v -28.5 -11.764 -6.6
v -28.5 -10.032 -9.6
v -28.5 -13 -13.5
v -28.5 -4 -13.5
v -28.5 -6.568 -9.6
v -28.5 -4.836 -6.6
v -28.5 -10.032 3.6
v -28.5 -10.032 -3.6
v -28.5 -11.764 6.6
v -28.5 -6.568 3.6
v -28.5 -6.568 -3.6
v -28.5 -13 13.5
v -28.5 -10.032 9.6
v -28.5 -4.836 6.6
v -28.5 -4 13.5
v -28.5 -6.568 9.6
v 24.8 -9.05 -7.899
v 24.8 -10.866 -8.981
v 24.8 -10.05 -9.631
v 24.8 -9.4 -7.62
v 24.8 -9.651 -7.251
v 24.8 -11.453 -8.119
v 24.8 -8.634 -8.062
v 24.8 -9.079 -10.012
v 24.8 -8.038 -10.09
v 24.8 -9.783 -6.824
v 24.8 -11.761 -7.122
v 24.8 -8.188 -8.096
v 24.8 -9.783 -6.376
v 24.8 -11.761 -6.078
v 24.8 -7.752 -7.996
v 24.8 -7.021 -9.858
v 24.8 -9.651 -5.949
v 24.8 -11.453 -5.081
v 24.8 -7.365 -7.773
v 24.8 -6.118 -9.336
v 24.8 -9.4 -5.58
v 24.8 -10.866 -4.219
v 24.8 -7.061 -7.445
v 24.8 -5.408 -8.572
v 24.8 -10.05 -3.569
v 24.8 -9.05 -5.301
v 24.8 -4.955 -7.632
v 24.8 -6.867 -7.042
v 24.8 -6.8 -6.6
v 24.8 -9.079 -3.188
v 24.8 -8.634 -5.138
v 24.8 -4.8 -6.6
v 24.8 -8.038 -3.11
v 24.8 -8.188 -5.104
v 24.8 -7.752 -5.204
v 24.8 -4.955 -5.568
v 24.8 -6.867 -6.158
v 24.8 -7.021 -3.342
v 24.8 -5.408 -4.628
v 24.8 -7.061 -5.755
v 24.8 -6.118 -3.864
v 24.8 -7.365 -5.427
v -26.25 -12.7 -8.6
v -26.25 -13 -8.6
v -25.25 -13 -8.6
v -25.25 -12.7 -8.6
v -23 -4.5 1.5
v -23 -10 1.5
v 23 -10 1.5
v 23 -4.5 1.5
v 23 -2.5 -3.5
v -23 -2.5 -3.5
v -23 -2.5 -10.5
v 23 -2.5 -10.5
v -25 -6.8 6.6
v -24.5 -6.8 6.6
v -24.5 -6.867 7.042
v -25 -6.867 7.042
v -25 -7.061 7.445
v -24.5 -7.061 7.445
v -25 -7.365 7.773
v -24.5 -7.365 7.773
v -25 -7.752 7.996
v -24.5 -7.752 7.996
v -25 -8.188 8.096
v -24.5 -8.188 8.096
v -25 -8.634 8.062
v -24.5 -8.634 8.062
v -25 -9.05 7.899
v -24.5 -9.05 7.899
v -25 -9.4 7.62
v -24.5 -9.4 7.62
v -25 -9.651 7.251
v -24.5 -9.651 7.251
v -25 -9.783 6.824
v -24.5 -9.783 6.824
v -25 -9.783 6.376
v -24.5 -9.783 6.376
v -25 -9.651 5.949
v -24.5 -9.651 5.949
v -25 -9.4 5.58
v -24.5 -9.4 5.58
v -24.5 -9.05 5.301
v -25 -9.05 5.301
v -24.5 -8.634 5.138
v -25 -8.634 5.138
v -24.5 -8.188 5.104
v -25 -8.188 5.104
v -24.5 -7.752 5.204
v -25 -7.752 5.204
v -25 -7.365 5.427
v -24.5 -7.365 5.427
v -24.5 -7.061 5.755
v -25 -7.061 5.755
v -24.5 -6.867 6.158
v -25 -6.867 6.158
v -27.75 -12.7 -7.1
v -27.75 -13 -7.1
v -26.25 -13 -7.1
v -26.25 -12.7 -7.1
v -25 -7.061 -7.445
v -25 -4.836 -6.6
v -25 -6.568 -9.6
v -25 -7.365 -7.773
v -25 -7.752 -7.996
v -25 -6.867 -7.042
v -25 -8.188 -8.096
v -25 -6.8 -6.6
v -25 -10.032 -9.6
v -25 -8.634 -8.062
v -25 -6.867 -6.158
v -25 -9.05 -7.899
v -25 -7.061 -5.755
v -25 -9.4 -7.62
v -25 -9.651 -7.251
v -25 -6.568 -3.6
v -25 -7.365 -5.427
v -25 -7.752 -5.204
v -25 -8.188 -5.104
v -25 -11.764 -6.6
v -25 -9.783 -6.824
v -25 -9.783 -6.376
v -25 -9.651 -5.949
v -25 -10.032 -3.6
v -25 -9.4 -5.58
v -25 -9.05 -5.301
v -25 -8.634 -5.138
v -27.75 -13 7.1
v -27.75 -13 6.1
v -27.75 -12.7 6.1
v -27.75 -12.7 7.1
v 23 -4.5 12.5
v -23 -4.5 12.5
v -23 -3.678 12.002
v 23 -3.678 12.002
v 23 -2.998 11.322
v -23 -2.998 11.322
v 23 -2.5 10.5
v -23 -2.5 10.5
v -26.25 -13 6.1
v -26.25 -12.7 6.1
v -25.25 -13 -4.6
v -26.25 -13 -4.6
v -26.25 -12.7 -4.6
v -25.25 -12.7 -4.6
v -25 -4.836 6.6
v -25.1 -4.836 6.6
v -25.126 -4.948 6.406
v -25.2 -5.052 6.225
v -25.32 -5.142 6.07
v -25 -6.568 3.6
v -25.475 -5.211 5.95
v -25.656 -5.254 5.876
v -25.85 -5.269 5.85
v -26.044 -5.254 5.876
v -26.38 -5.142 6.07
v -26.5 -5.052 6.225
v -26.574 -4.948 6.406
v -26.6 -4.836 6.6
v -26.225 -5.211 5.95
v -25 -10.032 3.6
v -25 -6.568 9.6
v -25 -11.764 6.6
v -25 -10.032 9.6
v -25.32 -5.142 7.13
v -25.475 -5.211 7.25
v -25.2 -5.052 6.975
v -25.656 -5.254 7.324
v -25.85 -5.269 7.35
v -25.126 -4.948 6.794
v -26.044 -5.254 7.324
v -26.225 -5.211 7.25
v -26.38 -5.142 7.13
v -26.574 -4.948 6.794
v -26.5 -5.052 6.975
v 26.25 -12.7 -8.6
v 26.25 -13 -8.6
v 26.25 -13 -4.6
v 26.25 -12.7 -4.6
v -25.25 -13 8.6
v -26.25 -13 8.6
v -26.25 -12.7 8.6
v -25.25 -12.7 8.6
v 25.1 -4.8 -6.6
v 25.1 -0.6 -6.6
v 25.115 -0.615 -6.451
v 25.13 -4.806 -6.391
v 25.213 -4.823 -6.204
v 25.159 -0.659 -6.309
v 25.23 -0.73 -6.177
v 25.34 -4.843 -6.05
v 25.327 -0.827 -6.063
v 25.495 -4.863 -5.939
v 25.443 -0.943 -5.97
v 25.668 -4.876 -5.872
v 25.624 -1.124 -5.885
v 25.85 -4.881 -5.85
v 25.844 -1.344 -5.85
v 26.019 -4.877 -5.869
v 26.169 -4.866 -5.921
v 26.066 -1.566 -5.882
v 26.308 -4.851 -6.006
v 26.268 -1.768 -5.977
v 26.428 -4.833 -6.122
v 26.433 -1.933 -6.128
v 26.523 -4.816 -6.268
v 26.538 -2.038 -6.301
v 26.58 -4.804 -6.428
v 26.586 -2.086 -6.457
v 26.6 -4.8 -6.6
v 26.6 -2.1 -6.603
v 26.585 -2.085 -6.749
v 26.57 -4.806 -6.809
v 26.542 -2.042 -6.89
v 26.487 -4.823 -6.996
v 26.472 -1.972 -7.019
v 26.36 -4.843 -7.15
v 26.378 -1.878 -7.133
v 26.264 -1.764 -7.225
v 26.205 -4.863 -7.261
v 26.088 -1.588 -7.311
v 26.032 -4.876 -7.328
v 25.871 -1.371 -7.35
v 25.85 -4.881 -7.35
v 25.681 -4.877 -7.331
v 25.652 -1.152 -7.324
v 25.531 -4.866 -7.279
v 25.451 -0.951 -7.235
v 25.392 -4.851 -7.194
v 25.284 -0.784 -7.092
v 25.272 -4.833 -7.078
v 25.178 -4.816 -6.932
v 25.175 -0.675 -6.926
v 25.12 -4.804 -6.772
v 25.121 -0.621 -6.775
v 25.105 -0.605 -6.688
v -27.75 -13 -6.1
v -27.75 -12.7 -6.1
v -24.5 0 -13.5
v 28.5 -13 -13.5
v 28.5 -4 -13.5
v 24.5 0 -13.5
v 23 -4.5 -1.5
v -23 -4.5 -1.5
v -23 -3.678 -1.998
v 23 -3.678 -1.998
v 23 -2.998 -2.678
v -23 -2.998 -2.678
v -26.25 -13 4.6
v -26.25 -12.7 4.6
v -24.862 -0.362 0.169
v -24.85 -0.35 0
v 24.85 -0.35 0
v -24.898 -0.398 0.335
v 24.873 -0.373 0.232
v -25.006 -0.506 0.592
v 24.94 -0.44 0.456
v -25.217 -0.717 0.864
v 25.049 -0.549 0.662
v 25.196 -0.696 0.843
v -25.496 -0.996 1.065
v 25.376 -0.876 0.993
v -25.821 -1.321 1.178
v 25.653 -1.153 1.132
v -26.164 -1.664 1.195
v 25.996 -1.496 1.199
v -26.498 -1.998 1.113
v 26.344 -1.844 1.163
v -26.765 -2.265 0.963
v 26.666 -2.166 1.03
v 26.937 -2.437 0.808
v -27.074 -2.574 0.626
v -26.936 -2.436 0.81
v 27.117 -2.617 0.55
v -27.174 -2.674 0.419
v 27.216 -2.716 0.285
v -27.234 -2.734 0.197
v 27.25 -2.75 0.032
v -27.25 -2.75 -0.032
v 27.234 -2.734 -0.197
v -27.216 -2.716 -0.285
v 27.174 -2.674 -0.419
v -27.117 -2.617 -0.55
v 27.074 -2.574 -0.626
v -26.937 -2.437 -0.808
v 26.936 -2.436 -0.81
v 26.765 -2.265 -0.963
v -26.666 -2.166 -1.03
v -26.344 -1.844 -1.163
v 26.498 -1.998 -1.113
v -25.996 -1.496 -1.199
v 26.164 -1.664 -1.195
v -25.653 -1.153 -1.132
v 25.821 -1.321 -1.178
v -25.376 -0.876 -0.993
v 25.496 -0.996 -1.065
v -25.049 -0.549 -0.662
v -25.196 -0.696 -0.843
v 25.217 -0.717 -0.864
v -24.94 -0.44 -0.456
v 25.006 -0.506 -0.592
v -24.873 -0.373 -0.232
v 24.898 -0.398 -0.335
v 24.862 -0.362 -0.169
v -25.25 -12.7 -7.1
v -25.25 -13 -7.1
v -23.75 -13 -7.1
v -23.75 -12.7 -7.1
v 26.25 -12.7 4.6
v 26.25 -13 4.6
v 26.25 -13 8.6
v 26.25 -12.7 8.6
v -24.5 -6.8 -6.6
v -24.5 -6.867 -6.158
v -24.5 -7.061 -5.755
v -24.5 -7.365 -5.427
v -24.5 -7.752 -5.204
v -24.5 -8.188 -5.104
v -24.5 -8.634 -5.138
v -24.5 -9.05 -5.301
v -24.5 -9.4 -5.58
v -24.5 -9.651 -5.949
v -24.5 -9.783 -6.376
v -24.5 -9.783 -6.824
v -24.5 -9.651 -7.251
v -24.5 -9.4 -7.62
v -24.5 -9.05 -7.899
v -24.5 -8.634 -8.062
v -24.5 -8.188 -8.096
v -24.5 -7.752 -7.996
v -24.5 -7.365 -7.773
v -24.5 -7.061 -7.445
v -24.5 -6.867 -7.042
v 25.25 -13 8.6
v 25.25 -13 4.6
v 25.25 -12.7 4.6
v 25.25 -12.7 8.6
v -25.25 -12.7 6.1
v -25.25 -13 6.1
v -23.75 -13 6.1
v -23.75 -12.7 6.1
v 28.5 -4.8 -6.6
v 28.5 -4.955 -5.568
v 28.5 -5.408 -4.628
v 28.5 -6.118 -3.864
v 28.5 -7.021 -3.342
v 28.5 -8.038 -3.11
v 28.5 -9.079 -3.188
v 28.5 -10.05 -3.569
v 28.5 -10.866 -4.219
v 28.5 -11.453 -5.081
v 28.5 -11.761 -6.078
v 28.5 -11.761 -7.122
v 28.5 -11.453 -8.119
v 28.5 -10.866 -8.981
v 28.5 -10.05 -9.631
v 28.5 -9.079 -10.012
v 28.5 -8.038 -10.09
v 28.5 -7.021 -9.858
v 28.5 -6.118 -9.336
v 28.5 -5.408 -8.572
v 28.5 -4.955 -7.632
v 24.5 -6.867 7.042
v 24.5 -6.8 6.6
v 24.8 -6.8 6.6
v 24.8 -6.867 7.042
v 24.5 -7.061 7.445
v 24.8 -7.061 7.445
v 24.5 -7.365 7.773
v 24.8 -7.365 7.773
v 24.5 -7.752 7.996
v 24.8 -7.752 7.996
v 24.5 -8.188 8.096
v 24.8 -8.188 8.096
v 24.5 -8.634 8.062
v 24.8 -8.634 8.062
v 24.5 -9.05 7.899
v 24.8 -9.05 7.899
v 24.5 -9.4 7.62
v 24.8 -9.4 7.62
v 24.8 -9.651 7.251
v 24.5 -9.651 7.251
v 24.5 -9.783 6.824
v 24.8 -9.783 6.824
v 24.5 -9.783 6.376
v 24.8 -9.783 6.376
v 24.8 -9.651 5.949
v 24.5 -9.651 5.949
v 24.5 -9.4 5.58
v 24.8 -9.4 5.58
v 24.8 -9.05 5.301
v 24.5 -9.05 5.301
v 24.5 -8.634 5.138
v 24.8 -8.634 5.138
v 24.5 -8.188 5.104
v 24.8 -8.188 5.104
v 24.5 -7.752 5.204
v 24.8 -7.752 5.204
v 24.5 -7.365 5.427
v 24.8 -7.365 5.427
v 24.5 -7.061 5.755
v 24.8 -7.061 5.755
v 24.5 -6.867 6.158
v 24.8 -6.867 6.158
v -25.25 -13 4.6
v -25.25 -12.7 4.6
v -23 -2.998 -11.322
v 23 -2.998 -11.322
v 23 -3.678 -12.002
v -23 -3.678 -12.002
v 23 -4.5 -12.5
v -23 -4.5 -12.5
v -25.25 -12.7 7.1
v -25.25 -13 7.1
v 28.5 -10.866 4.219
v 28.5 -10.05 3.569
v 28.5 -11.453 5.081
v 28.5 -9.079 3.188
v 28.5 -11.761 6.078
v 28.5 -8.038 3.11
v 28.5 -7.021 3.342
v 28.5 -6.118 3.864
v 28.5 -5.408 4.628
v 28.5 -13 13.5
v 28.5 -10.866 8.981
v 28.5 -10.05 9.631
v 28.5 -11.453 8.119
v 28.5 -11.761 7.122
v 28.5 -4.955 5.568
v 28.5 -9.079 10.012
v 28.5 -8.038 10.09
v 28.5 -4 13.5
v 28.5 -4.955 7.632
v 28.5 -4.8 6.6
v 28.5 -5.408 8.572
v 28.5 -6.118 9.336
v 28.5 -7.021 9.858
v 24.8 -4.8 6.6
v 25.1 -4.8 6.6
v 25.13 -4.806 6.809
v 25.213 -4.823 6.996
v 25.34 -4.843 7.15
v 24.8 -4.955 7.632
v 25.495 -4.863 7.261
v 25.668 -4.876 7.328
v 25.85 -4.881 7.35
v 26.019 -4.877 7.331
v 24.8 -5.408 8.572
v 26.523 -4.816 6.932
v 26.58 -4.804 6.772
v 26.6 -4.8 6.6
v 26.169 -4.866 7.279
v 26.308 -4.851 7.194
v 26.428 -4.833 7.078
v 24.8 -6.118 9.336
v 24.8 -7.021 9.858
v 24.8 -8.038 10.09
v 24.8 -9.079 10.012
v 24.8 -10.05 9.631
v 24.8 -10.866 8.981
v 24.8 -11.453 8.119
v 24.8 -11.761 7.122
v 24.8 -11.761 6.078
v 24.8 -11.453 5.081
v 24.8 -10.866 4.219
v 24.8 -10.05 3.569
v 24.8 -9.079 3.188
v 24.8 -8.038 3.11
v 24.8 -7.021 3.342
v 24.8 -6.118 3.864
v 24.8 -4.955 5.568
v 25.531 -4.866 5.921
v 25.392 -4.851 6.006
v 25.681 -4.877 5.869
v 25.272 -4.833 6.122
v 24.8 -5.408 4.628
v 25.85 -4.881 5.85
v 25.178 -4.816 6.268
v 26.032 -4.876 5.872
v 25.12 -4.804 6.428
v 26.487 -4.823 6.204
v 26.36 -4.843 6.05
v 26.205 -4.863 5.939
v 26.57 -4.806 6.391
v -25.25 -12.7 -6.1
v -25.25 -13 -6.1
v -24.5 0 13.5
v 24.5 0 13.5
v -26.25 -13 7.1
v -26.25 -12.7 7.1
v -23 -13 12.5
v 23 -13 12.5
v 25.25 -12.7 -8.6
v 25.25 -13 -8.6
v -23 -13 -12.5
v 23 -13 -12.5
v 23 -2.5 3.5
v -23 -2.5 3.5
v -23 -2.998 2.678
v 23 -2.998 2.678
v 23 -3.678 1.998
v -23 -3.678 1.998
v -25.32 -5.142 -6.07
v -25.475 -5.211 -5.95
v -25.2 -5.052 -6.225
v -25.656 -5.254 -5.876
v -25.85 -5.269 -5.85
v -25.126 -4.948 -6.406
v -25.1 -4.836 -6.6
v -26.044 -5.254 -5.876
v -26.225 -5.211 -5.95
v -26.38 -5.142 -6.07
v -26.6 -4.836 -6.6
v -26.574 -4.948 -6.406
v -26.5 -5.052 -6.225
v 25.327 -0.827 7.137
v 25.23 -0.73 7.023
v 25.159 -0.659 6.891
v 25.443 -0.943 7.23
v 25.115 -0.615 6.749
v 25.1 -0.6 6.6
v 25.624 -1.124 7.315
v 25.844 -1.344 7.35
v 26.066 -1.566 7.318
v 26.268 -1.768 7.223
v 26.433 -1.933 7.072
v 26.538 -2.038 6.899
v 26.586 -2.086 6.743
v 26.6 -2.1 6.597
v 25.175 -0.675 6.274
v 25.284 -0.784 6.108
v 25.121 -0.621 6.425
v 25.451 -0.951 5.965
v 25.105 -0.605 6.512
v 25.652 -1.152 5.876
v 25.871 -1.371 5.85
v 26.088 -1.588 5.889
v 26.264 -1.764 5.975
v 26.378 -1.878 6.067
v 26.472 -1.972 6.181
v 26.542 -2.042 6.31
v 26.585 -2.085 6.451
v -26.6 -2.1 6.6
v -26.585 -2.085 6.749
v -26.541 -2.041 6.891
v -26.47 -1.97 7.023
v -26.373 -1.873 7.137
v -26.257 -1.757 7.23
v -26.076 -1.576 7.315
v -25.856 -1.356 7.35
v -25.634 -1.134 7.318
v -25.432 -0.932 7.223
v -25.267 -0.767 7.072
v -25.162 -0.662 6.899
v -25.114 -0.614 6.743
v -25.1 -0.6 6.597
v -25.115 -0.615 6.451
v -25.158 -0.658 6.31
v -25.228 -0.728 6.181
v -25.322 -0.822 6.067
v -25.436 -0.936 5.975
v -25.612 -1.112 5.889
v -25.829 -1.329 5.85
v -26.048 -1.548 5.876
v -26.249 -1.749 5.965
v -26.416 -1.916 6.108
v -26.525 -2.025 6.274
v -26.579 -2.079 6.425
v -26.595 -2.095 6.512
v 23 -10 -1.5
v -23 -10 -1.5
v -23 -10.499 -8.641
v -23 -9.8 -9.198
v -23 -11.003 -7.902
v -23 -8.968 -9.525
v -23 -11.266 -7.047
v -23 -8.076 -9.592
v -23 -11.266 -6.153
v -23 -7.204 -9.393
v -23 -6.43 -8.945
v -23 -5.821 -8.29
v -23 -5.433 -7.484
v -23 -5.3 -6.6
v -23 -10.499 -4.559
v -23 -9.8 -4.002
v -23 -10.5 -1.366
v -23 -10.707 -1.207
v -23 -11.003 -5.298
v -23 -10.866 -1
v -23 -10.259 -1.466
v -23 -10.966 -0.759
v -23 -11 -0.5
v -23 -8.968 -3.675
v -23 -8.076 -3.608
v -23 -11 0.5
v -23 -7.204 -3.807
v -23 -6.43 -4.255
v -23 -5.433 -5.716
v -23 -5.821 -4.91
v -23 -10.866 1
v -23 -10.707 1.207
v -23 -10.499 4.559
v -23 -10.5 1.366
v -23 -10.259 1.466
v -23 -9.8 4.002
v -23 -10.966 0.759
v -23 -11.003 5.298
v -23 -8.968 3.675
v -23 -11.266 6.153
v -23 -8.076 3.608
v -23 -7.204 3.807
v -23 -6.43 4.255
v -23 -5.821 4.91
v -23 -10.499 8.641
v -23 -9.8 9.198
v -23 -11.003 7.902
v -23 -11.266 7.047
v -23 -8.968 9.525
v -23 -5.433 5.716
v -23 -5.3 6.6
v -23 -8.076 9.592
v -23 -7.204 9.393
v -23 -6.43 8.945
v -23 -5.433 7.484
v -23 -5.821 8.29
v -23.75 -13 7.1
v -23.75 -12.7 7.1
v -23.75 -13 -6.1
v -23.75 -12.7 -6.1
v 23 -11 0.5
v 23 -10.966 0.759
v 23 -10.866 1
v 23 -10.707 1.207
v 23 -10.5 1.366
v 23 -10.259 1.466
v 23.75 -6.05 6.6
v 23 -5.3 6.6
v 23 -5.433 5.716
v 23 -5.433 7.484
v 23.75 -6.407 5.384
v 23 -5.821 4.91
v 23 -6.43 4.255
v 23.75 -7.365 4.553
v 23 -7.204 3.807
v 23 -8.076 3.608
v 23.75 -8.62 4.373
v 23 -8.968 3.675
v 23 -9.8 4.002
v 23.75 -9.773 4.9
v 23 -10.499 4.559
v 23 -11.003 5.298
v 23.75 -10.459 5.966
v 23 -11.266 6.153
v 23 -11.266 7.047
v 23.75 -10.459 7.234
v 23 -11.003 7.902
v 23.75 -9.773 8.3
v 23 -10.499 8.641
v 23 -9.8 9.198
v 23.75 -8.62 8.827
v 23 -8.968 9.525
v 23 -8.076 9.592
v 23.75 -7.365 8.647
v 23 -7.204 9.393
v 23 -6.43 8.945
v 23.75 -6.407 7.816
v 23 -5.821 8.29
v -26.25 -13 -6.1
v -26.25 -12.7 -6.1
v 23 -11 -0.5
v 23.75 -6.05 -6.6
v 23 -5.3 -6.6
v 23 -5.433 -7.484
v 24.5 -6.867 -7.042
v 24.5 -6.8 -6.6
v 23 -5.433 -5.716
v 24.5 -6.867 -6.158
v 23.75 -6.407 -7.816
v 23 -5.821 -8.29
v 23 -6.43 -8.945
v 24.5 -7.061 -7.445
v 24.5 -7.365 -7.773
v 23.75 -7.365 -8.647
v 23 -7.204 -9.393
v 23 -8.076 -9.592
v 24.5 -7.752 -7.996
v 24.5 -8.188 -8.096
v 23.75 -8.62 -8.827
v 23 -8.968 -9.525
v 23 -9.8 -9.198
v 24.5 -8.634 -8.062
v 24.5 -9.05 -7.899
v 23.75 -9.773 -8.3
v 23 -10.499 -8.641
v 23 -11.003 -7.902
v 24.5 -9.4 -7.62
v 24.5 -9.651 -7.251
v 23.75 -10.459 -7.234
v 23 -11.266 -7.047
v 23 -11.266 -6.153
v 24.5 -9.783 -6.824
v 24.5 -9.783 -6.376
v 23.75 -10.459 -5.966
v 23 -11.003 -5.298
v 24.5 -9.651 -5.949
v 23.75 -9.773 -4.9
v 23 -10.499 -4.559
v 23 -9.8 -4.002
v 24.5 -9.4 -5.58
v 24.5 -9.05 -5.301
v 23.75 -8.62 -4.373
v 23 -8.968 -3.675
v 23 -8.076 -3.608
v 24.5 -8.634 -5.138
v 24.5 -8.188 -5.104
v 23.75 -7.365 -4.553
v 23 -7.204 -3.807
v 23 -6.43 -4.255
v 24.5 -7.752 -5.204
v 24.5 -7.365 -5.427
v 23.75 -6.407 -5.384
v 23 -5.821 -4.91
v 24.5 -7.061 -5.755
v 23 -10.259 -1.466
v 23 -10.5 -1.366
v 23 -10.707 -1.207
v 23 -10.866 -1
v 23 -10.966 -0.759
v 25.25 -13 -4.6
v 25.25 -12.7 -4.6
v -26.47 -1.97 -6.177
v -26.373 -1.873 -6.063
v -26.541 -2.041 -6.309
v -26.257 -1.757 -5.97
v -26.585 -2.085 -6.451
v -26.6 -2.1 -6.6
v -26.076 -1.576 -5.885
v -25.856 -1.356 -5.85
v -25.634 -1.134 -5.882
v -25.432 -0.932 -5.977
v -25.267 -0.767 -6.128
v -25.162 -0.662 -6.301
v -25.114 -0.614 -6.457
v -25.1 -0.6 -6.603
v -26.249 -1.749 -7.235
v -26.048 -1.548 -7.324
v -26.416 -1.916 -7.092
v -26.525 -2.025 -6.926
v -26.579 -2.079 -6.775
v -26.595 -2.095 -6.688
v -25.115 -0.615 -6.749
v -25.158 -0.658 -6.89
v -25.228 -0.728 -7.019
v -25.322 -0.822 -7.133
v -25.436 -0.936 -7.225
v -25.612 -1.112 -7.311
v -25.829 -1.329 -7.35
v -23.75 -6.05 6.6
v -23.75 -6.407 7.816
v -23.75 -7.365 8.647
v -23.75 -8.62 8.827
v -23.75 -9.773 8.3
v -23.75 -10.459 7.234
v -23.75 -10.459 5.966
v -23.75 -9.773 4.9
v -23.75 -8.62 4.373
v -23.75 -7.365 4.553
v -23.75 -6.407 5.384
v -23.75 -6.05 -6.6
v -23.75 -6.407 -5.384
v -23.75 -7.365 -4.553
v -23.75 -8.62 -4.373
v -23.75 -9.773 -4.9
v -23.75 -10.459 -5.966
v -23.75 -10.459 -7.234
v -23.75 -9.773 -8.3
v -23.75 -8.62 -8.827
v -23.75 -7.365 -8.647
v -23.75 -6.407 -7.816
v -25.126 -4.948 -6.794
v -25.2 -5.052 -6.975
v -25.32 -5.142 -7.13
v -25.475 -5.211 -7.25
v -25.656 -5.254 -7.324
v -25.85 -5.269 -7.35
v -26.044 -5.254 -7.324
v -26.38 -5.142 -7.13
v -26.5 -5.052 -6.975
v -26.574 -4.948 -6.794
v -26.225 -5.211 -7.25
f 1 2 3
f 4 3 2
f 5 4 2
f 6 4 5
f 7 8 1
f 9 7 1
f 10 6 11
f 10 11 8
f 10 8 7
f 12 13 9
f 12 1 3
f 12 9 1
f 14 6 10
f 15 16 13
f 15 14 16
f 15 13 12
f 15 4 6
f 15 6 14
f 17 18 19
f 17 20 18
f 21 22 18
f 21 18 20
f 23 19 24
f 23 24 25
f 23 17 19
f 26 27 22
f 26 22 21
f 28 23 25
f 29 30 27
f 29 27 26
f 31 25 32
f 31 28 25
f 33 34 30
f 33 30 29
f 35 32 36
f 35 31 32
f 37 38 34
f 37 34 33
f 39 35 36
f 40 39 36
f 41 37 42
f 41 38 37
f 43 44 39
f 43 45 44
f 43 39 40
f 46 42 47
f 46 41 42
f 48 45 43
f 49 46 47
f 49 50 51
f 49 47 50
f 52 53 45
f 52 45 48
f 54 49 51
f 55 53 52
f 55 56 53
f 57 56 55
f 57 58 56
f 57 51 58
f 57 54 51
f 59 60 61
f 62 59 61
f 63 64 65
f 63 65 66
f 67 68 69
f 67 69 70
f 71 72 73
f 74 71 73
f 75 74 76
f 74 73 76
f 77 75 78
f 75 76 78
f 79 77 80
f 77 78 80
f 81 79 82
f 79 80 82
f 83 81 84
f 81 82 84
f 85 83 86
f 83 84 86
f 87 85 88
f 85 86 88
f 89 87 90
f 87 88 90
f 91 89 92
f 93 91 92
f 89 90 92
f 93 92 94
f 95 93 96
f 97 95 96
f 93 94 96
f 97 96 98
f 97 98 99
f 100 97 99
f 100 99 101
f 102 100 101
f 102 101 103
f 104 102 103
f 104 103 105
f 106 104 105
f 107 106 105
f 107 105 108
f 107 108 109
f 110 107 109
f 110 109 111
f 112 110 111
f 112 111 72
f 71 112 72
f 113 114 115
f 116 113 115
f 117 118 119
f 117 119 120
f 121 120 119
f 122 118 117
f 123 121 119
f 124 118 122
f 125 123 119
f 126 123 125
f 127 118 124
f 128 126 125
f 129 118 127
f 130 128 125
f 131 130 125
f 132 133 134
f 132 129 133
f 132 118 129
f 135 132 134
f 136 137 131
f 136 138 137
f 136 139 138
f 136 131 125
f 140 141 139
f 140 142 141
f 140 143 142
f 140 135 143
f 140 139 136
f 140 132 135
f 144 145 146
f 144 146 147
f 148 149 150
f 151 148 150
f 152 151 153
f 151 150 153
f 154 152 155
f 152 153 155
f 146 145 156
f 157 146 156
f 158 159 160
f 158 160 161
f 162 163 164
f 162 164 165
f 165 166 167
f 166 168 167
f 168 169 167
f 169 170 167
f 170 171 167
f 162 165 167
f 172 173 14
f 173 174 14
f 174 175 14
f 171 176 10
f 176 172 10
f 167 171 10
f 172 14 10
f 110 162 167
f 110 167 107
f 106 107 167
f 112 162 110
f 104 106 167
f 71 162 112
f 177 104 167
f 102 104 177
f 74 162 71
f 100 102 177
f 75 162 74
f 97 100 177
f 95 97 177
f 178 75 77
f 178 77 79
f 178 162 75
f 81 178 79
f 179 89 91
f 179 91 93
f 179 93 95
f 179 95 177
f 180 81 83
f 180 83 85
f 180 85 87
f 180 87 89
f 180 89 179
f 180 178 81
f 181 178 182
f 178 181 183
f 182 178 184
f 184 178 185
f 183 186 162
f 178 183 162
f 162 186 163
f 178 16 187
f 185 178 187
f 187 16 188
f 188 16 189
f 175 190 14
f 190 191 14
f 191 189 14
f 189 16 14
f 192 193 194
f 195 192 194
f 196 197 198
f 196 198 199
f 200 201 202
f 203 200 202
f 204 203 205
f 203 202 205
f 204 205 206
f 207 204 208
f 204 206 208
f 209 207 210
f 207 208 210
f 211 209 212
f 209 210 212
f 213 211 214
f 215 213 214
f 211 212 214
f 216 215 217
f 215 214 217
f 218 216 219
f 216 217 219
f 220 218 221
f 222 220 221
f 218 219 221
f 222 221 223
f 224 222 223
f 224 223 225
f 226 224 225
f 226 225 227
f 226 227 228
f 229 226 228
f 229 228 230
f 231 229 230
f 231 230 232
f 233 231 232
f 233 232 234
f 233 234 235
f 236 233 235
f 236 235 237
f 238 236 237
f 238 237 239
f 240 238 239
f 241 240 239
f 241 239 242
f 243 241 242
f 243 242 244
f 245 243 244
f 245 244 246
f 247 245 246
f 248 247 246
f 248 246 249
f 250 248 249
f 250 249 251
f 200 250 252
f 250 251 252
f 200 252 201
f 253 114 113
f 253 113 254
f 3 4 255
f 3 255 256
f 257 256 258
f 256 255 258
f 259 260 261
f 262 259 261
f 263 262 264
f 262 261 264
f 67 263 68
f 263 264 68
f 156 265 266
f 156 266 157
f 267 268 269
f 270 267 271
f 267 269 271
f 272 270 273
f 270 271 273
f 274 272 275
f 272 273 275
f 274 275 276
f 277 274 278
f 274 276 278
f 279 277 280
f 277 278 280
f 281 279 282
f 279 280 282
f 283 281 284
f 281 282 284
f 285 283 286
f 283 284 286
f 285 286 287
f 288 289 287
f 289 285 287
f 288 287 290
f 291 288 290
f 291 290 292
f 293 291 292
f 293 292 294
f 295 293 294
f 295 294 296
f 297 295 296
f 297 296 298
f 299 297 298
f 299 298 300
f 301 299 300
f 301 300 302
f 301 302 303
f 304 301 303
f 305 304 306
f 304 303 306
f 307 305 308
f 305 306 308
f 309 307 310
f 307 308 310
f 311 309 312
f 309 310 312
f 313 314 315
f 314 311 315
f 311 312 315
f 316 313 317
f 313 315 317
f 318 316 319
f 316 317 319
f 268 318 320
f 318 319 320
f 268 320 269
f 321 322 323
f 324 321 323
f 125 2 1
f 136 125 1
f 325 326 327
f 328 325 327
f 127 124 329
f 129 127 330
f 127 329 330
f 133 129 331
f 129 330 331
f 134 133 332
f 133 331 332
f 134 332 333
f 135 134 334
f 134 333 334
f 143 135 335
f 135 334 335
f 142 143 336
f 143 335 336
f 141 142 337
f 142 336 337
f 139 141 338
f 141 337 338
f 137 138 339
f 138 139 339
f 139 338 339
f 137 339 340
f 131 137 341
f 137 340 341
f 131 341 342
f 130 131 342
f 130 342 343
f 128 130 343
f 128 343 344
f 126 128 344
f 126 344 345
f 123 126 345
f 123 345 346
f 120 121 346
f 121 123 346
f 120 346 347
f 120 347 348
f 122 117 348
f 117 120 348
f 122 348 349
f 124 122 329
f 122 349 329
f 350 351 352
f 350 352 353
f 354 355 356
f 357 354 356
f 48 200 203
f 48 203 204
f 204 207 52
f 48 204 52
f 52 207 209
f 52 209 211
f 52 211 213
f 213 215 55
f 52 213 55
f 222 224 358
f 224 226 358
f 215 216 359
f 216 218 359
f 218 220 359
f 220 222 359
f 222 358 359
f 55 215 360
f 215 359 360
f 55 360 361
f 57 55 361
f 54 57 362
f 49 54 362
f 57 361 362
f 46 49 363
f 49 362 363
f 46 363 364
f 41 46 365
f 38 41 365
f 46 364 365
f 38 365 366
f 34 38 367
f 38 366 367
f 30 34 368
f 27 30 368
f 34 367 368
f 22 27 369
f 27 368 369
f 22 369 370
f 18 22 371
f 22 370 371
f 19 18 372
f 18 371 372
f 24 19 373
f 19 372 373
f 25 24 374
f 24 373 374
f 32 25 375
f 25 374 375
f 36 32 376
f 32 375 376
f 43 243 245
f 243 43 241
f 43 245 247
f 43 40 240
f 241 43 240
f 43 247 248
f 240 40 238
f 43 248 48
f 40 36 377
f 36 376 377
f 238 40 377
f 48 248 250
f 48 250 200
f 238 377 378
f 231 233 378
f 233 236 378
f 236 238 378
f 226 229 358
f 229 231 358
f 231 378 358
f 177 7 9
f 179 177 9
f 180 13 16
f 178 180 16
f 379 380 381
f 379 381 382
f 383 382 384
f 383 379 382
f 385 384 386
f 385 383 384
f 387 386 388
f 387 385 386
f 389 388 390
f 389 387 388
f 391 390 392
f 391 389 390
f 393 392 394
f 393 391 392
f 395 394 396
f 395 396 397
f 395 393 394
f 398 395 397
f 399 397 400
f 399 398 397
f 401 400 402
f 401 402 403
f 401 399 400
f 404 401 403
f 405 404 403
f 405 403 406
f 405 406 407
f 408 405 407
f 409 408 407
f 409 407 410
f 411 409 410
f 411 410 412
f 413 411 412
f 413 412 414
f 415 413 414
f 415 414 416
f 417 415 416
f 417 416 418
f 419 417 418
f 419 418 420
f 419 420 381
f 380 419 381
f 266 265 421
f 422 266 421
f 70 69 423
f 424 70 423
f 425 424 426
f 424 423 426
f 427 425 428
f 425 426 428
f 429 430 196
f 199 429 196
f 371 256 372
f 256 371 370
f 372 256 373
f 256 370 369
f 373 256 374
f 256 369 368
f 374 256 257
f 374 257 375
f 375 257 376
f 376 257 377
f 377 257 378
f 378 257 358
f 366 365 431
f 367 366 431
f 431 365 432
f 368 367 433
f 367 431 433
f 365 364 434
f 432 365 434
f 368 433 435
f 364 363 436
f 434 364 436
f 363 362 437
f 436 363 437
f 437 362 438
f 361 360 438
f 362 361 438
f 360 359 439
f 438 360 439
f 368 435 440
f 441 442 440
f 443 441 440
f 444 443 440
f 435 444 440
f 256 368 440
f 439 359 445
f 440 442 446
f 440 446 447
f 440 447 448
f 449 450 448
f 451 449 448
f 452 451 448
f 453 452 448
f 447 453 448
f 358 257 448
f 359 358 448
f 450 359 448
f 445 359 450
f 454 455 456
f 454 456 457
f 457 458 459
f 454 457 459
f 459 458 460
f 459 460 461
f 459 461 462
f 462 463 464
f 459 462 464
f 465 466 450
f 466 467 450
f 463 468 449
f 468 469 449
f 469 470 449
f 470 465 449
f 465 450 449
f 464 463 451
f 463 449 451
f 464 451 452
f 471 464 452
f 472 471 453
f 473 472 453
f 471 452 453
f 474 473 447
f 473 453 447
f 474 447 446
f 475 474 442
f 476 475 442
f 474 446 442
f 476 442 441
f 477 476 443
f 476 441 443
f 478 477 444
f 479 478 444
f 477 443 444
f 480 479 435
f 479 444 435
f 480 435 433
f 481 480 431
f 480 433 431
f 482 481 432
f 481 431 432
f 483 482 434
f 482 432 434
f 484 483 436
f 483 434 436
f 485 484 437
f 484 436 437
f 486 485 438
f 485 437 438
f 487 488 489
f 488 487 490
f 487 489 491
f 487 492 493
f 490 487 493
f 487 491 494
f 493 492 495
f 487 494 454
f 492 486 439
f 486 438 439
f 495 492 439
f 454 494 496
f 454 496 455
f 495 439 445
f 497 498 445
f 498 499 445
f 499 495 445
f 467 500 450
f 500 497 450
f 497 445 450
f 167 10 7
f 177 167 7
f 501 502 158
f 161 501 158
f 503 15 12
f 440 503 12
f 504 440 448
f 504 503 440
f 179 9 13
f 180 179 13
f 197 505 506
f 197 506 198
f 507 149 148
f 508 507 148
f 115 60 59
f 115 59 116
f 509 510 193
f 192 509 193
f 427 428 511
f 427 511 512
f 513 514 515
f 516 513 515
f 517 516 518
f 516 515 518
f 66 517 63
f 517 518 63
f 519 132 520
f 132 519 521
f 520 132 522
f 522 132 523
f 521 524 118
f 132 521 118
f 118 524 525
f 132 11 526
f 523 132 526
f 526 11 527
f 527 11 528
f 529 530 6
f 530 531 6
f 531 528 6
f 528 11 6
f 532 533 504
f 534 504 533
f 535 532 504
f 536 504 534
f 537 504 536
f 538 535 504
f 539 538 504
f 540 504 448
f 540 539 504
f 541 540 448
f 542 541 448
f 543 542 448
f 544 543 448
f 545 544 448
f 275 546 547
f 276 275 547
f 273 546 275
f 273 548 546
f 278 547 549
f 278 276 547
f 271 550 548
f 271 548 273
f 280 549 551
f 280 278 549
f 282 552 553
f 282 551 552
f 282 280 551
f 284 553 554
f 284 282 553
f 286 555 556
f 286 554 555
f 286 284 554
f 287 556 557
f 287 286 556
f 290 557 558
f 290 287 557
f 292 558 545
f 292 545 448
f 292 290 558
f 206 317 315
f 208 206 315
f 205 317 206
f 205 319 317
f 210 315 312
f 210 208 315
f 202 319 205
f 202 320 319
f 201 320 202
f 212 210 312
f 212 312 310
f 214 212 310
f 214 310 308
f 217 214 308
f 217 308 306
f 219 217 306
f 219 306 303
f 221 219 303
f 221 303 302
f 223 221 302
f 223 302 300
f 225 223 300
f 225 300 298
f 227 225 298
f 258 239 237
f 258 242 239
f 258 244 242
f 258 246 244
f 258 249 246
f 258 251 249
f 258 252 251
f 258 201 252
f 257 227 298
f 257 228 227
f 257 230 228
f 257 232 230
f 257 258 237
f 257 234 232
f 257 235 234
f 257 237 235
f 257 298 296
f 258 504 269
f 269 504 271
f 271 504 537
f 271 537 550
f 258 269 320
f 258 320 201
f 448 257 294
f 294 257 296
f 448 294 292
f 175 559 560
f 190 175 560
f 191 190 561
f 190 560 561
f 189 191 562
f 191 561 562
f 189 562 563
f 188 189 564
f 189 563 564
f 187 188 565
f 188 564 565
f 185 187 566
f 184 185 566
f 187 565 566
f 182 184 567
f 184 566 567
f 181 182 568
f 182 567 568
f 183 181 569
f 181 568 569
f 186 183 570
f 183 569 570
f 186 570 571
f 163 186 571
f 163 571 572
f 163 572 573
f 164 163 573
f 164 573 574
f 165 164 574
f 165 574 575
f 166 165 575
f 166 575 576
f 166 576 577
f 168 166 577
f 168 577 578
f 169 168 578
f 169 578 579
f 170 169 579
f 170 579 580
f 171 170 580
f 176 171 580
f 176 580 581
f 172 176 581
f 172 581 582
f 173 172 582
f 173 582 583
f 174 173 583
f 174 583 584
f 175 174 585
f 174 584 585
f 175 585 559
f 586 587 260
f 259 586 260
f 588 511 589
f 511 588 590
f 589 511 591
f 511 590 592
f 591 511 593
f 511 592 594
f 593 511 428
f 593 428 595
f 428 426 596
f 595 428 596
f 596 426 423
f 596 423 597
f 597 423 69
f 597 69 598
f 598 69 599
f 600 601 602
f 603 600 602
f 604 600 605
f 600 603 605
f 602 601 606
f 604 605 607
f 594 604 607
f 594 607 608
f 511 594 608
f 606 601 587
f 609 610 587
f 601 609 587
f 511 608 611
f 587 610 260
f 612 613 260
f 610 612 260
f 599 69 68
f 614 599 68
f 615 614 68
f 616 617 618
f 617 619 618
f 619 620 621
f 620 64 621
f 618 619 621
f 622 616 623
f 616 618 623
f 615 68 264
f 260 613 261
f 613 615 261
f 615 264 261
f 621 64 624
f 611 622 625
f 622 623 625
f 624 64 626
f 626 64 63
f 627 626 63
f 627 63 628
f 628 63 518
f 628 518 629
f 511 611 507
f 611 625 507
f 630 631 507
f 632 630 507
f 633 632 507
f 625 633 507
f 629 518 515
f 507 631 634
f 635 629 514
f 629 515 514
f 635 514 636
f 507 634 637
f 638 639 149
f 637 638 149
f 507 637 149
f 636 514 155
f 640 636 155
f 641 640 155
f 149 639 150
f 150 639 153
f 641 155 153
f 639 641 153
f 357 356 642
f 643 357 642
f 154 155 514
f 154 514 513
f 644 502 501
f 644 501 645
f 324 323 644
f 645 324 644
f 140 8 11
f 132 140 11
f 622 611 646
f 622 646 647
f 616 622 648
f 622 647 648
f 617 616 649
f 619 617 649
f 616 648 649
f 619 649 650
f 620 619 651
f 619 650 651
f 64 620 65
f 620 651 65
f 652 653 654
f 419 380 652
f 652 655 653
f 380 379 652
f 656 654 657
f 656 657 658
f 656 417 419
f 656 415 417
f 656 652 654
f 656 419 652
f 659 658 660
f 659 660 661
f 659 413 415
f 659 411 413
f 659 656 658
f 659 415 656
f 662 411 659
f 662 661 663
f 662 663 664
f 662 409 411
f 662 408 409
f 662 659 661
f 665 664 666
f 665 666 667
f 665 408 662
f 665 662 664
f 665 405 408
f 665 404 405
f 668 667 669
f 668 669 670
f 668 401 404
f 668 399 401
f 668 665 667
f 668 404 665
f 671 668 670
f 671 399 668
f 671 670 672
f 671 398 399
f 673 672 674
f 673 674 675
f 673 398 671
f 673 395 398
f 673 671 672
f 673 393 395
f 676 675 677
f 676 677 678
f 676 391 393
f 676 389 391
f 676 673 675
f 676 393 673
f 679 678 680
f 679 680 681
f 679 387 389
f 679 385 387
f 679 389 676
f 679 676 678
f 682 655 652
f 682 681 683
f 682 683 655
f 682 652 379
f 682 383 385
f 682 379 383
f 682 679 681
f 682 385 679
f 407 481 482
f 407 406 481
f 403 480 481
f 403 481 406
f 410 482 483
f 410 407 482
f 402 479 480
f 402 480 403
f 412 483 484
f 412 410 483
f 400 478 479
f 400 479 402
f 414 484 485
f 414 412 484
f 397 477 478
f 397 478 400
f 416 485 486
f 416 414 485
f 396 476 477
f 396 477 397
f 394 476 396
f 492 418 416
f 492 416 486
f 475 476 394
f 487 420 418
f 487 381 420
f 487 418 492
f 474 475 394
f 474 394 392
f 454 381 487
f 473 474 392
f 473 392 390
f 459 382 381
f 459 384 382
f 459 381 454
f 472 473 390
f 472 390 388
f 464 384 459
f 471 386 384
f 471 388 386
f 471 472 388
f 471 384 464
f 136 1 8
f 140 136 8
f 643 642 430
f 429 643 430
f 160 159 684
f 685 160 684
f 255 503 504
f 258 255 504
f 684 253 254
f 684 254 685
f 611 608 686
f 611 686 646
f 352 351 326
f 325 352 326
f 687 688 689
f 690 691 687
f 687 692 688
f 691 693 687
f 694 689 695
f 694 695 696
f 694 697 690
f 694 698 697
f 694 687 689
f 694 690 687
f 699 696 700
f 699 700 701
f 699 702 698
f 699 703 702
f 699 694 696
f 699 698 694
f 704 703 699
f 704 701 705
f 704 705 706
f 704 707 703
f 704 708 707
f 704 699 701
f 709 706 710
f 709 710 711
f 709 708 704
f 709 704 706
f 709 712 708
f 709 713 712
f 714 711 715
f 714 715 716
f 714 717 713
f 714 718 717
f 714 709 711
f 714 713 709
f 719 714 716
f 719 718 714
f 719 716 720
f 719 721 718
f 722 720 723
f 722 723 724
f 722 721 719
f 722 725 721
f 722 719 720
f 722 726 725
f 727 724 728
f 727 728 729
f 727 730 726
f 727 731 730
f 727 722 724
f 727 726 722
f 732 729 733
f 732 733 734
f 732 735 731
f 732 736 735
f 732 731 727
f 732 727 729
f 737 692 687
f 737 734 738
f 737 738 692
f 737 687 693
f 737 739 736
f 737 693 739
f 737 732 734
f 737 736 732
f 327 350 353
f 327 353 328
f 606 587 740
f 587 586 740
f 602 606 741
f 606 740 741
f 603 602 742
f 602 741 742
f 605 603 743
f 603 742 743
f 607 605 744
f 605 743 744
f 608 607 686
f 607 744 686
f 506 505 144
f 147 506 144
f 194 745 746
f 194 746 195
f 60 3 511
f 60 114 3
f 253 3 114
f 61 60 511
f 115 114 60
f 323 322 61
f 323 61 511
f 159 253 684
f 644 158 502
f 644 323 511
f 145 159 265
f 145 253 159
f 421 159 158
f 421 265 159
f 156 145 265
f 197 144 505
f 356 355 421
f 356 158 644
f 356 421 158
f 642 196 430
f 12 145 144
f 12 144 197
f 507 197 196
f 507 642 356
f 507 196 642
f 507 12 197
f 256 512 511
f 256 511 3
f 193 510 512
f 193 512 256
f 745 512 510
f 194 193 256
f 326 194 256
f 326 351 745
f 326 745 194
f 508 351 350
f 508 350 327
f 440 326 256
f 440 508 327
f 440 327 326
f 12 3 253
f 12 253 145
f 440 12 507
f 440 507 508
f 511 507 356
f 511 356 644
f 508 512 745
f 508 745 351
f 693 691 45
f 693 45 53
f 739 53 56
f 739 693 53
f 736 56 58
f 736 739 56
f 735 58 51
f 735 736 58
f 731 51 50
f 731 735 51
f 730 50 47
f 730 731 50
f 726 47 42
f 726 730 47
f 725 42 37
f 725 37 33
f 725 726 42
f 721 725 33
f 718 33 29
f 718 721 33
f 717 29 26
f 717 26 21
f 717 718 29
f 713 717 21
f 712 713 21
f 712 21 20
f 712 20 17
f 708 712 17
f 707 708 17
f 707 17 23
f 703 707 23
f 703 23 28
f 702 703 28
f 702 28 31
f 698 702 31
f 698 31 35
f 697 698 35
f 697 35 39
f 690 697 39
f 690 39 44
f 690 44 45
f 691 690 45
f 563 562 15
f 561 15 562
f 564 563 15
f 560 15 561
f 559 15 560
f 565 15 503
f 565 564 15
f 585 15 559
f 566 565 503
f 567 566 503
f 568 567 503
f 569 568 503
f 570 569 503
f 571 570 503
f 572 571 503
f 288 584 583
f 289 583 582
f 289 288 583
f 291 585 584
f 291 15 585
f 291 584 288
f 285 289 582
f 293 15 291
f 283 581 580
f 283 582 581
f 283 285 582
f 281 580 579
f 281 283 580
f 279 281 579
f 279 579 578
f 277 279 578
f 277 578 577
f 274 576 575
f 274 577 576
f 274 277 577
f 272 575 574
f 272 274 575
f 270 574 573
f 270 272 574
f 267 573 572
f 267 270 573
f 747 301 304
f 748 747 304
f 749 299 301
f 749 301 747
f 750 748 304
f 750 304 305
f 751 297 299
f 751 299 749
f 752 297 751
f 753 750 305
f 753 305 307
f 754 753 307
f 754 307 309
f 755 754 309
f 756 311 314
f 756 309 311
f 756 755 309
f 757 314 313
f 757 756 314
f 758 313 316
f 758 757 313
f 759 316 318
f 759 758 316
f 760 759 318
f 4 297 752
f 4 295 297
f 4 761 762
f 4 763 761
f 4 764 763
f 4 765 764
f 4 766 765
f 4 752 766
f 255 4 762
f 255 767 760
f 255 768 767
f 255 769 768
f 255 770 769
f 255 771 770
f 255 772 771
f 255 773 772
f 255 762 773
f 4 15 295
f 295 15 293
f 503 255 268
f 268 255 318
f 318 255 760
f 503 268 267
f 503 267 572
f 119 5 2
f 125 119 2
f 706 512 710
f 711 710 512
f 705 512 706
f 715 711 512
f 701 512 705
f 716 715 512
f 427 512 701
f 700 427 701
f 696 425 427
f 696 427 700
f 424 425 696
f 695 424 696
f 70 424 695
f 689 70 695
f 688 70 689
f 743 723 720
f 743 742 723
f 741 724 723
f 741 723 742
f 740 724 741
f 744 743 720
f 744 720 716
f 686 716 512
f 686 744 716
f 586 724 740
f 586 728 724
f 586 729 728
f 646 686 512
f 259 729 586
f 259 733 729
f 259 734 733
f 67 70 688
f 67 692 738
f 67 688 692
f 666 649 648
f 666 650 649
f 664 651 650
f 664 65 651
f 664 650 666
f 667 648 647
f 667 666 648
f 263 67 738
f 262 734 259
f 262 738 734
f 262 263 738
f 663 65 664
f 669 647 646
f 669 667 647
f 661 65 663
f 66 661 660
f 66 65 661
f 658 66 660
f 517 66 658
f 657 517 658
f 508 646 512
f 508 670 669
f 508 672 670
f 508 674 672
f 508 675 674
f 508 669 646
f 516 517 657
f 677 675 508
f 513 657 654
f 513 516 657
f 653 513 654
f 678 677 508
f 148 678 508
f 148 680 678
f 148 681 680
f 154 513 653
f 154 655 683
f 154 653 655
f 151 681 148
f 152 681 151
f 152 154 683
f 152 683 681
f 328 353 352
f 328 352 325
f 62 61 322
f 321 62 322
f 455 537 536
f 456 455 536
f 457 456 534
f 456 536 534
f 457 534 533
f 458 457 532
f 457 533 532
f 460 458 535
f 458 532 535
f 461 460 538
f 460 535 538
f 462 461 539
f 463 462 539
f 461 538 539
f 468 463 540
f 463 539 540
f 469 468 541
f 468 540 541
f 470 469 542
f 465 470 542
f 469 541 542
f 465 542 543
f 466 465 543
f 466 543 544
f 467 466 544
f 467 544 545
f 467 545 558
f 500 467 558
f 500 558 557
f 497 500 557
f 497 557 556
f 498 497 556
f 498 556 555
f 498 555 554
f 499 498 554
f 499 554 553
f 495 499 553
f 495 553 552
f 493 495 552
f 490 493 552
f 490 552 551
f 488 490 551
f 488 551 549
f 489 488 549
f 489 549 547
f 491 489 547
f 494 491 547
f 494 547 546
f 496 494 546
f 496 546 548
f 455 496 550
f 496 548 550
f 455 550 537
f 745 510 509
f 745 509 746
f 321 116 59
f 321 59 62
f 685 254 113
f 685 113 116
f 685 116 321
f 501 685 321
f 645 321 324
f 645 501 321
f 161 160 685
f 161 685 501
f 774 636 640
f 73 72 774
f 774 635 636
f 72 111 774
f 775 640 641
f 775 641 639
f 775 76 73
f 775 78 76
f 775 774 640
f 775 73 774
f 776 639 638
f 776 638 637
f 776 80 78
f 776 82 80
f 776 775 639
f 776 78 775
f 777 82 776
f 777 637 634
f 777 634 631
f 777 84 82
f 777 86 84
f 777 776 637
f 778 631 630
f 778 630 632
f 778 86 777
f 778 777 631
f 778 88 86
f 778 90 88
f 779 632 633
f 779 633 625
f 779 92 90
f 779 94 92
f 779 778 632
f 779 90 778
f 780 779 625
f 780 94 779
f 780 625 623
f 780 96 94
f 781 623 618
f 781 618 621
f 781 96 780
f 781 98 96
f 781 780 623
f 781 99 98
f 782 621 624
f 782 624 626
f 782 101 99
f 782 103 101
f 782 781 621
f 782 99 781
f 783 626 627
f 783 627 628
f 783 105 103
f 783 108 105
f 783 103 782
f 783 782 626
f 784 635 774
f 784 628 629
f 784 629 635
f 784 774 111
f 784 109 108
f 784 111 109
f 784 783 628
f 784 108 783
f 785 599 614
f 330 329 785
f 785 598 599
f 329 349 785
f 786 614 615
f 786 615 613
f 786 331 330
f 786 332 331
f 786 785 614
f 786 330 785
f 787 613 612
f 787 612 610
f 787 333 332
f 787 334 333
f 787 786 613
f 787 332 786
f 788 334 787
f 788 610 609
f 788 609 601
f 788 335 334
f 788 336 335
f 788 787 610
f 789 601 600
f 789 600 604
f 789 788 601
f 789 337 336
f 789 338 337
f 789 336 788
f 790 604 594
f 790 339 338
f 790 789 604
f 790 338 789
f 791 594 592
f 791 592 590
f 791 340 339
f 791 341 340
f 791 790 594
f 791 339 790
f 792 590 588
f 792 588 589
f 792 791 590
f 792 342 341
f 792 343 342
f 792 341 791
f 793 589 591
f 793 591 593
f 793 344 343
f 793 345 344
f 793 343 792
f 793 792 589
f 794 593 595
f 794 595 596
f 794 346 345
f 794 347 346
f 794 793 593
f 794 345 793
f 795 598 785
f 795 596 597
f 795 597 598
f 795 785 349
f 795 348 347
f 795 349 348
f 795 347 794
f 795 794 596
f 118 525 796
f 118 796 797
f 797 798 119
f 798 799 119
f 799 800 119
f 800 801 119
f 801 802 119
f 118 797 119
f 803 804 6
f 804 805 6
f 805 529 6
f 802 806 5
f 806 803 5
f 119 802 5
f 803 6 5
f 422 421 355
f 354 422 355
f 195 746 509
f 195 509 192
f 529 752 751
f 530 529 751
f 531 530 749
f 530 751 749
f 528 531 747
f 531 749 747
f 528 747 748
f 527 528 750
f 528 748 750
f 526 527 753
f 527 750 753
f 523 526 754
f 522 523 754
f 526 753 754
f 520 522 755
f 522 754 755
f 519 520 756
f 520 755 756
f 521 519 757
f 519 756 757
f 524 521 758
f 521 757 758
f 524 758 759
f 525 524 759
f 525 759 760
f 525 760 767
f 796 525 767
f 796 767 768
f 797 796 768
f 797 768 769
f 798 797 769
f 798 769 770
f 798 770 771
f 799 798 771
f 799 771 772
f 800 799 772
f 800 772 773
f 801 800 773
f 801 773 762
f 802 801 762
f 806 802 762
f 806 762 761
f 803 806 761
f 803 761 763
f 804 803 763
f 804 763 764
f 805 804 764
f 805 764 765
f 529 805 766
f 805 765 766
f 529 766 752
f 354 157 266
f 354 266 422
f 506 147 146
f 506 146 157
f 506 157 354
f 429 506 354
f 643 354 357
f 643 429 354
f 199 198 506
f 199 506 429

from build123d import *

# Parameters (mm, degrees)
F0_W          = 57
F0_H          = 27
F0_W_2        = 46
F0_H_2        = 25
F1_DEPTH      = 13
F2_DEPTH      = 2.5
F3_W          = 10
F3_H          = 3
F4_DEPTH      = 46
F5_R          = 1.5
F6_DEPTH      = 5.501
F6_DEPTH_BACK = 51.501
F7_SIZE       = 1.5
F8_R          = 1.5
F9_DEPTH      = 3.5
F10_R         = 3.5
F10_R_2       = 1.5
F11_DEPTH     = 3.7
F13_DEPTH     = 46
F14_R         = 1.2
F15_DEPTH     = 57.001
F16_R         = 0.75
F17_DEPTH     = 6
F18_T1_DEPTH  = 47.5734639037
F19_W         = 1
F19_H         = 4
F19_H_2       = 1.5
F19_W_2       = 1.5
F19_H_3       = 1
F20_DEPTH     = 0.3
F21_R         = 1


# Not quite as in the source:
# - a fillet or chamfer that OpenCascade refuses, or shapes differently, is made with other operations: its cross-section is extruded or revolved along the edge and cut away or added


with BuildPart() as f1:
    # F0 (on Front) → F1 (new body)
    with BuildSketch(Plane.XZ):
        Rectangle(F0_W, F0_H)
        Rectangle(F0_W_2, F0_H_2, mode=Mode.SUBTRACT)
    extrude(amount=F1_DEPTH)

    # F0 (on Front) → F2 (join)
    with BuildSketch(Plane.XZ):
        Rectangle(F0_W_2, F0_H_2)
    extrude(amount=F2_DEPTH)

    # F3 (on face) → F4 (join, through all)
    with BuildSketch(Plane.YZ.offset(-23)):
        with Locations((-6, 0)):
            Rectangle(F3_W, F3_H)
    extrude(amount=F4_DEPTH)

    # F5 (on face) → F6 (cut, two sides)
    with BuildSketch(Plane.YZ.offset(-23)) as f6_sk:
        with Locations((-8.3, 6.6)):
            Circle(F5_R)
        with Locations((-8.3, -6.6)):
            Circle(F5_R)
    extrude(amount=-F6_DEPTH, mode=Mode.SUBTRACT)
    extrude(f6_sk.sketch, amount=F6_DEPTH_BACK, mode=Mode.SUBTRACT)

    # F7
    f7_edges = [f1.edges().sort_by_distance(p)[0] for p in [
        (-23, -9.8, 6.6),
        (-23, -9.8, -6.6),
        (23, -9.8, 6.6),
        (23, -9.8, -6.6),
    ]]
    chamfer(f7_edges, length=F7_SIZE)

    # F8 (on face) → F9 (cut)
    with BuildSketch(Plane(origin=(-28.5, 0, 0), x_dir=(0, -1, 0), z_dir=(-1, 0, 0))):
        Polygon((6.5679491924, -3.6), (4.8358983849, -6.6), (6.5679491924, -9.6), (10.0320508076, -9.6), (11.7641016151, -6.6), (10.0320508076, -3.6), align=None)
        with Locations((8.3, -6.6)):
            Circle(F8_R, mode=Mode.SUBTRACT)
        Polygon((10.0320508076, 9.6), (6.5679491924, 9.6), (4.8358983849, 6.6), (6.5679491924, 3.6), (10.0320508076, 3.6), (11.7641016151, 6.6), align=None)
        with Locations((8.3, 6.6)):
            Circle(F8_R, mode=Mode.SUBTRACT)
        with Locations((8.3, 6.6)):
            Circle(F8_R)
    extrude(amount=-F9_DEPTH, mode=Mode.SUBTRACT)

    # F10 (on face) → F11 (cut)
    with BuildSketch(Plane.YZ.offset(28.5)):
        with Locations((-8.3, 6.6)):
            Circle(F10_R)
        with Locations((-8.3, 6.6)):
            Circle(F10_R_2, mode=Mode.SUBTRACT)
        with Locations((-8.3, -6.6)):
            Circle(F10_R)
        with Locations((-8.3, -6.6)):
            Circle(F10_R_2, mode=Mode.SUBTRACT)
    extrude(amount=-F11_DEPTH, mode=Mode.SUBTRACT)

    # F12 (on face) → F13 (join, through all)
    with BuildSketch(Plane.YZ.offset(-23)):
        with BuildLine():
            Line((-2.5, -12.5), (-2.5, -10.5))
            ThreePointArc((-2.5, -10.5), (-3.3173241863, -11.6826758137), (-4.5, -12.5))
            Line((-4.5, -12.5), (-2.5, -12.5))
        make_face()
        with BuildLine():
            ThreePointArc((-4.5, -1.5), (-3.3173241863, -2.3173241863), (-2.5, -3.5))
            Line((-2.5, -3.5), (-2.5, -1.5))
            Line((-2.5, -1.5), (-4.5, -1.5))
        make_face()
        with BuildLine():
            Line((-2.5, 12.5), (-4.5, 12.5))
            ThreePointArc((-4.5, 12.5), (-3.3173241863, 11.6826758137), (-2.5, 10.5))
            Line((-2.5, 10.5), (-2.5, 12.5))
        make_face()
        with BuildLine():
            ThreePointArc((-2.5, 3.5), (-3.3173241863, 2.3173241863), (-4.5, 1.5))
            Line((-4.5, 1.5), (-2.5, 1.5))
            Line((-2.5, 1.5), (-2.5, 3.5))
        make_face()
    extrude(amount=F13_DEPTH)

    # F14 (on face) → F15 (cut, through all)
    with BuildSketch(Plane.YZ.offset(28.5)):
        with Locations((-1.55, 0)):
            Circle(F14_R)
    extrude(amount=-F15_DEPTH, mode=Mode.SUBTRACT)

    # F16 (on face) → F17 (cut)
    with BuildSketch(Plane(origin=(0, 0, 0), x_dir=(-1, 0, 0), z_dir=(0, 1, 0))):
        with Locations((-25.85, -6.6)):
            Circle(F16_R)
        with Locations((-25.85, 6.6)):
            Circle(F16_R)
        with Locations((25.85, 6.6)):
            Circle(F16_R)
        with Locations((25.85, -6.6)):
            Circle(F16_R)
    extrude(amount=-F17_DEPTH, mode=Mode.SUBTRACT)

    # F18: chamfer of 4 on 2 edges, made by hand

    # F18_s2 → F18_t1 (cut)
    with BuildSketch(Plane.XY.offset(-23.7867319519)):
        Polygon((24.5, 0), (28.5, -4), (28.5, 0), align=None)
        Polygon((-28.5, -4), (-24.5, 0), (-28.5, 0), align=None)
    extrude(amount=F18_T1_DEPTH, mode=Mode.SUBTRACT)

    # F19 (on face) → F20 (cut)
    with BuildSketch(Plane.XZ.offset(13)):
        with Locations((25.75, -6.6)):
            Rectangle(F19_W, F19_H)
        with Locations((25.75, 6.6)):
            Rectangle(F19_W, F19_H)
        with Locations((-25.75, 5.35)):
            Rectangle(F19_W, F19_H_2)
        with Locations((-27, 6.6)):
            Rectangle(F19_W_2, F19_H_3)
        with Locations((-25.75, 6.6)):
            Rectangle(F19_W, F19_H_3)
        with Locations((-24.5, 6.6)):
            Rectangle(F19_W_2, F19_H_3)
        with Locations((-25.75, 7.85)):
            Rectangle(F19_W, F19_H_2)
        with Locations((-25.75, -5.35)):
            Rectangle(F19_W, F19_H_2)
        with Locations((-24.5, -6.6)):
            Rectangle(F19_W_2, F19_H_3)
        with Locations((-25.75, -6.6)):
            Rectangle(F19_W, F19_H_3)
        with Locations((-27, -6.6)):
            Rectangle(F19_W_2, F19_H_3)
        with Locations((-25.75, -7.85)):
            Rectangle(F19_W, F19_H_2)
    extrude(amount=-F20_DEPTH, mode=Mode.SUBTRACT)

    # F21
    f21_edges = [f1.edges().sort_by_distance(p)[0] for p in [
        (0, -11, -1.5),
        (0, -11, 1.5),
    ]]
    fillet(f21_edges, radius=F21_R)


solid = f1.part
